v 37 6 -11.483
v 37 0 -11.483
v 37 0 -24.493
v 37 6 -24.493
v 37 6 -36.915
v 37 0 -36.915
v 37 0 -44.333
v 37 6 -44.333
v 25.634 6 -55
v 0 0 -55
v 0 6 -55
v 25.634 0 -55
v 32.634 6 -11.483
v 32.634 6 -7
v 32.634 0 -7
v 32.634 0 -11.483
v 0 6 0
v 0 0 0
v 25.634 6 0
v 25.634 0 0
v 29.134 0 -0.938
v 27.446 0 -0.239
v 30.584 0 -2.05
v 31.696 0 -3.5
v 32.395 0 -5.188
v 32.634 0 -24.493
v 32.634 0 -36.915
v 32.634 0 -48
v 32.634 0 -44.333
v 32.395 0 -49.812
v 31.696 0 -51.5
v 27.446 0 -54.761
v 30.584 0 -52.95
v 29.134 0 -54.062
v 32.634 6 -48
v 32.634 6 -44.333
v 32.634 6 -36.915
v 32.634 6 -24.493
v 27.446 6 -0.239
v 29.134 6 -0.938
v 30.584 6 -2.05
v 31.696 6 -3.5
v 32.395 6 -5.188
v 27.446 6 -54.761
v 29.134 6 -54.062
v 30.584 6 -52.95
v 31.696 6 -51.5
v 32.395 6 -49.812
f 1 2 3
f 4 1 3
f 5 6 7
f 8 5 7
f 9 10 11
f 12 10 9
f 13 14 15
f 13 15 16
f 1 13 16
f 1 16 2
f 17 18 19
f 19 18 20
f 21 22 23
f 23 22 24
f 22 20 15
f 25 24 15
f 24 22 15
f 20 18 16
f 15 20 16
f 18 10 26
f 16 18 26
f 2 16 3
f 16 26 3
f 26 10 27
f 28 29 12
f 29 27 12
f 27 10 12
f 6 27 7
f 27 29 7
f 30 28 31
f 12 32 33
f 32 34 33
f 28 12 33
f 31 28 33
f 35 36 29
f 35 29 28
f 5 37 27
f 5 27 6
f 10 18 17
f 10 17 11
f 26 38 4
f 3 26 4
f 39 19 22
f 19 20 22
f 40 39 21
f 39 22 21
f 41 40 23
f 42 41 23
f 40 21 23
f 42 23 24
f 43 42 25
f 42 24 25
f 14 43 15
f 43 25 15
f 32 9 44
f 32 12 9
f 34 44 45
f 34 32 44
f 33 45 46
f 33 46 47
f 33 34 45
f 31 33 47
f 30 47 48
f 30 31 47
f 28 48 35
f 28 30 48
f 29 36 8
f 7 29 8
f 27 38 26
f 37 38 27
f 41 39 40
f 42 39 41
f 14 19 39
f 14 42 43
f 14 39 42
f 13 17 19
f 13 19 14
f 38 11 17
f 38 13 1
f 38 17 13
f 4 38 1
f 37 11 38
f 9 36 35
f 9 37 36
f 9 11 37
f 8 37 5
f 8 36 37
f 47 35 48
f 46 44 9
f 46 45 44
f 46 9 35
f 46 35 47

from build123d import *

# Parameters (mm, degrees)
SKETCH1_W           = 37
SKETCH1_H           = 55
BOSS_EXTRUDE1_DEPTH = 6
SKETCH2_W           = 4.36600783
SKETCH2_H           = 10.66713821
SKETCH2_H_2         = 12.422520393
SKETCH2_H_3         = 11.48339845
CUT_EXTRUDE1_DEPTH  = 67.558245169
FILLET1_R           = 7


with BuildPart() as part:
    # Sketch1 → Boss-Extrude1 (new body)
    with BuildSketch(Plane(origin=(0, 0, 0), x_dir=(1, 0, 0), z_dir=(0, 1, 0))):
        with Locations((18.5, 27.5)):
            Rectangle(SKETCH1_W, SKETCH1_H)
    extrude(amount=BOSS_EXTRUDE1_DEPTH)

    # Sketch2 → Cut-Extrude1 (cut, through all)
    with BuildSketch(Plane(origin=(0, 6, 0), x_dir=(1, 0, 0), z_dir=(0, 1, 0))):
        with Locations((34.816996085, 49.666430895)):
            Rectangle(SKETCH2_W, SKETCH2_H)
        with Locations((34.816996085, 30.703899365)):
            Rectangle(SKETCH2_W, SKETCH2_H_2)
        with Locations((34.816996085, 5.741699225)):
            Rectangle(SKETCH2_W, SKETCH2_H_3)
    extrude(amount=-CUT_EXTRUDE1_DEPTH, mode=Mode.SUBTRACT)

    # Fillet1
    fillet1_edges = [part.edges().sort_by_distance(p)[0] for p in [
        (32.63399217, 3, -55),
        (32.63399217, 3, 0),
    ]]
    fillet(fillet1_edges, radius=FILLET1_R)


solid = part.part
